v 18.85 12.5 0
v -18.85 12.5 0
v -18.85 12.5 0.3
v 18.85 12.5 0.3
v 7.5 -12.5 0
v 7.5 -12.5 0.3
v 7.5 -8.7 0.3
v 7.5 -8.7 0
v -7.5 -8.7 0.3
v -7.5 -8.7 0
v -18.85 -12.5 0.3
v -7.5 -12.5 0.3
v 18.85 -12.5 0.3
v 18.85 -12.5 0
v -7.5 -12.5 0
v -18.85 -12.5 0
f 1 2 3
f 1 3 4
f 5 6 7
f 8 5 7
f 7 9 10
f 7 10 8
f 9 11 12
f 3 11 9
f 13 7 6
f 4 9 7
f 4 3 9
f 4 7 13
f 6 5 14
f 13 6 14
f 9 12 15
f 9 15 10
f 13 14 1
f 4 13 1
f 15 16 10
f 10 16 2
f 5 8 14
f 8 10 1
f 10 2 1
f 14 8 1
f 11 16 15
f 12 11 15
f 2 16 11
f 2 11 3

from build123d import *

# Parameters (mm, degrees)
SKETCH1_W           = 37.7
SKETCH1_H           = 25
BOSS_EXTRUDE1_DEPTH = 0.3
CUT_EXTRUDE1_REACH  = 24.62
SKETCH2_W           = 15
SKETCH2_H           = 6


with BuildPart() as part:
    # Sketch1 → Boss-Extrude1 (new body)
    with BuildSketch(Plane.XY):
        Rectangle(SKETCH1_W, SKETCH1_H)
    extrude(amount=BOSS_EXTRUDE1_DEPTH)

    # Sketch2 → Cut-Extrude1 (cut, up to next)
    with BuildSketch(Plane.XY.offset(0.3), mode=Mode.PRIVATE) as cut_extrude1_sk1:
        with Locations((0, -11.7)):
            Rectangle(SKETCH2_W, SKETCH2_H)
    cut_extrude1_tool1 = extrude(cut_extrude1_sk1.sketch, amount=-CUT_EXTRUDE1_REACH, mode=Mode.PRIVATE) & part.part
    add(cut_extrude1_tool1.solids().sort_by_distance((0, -11.7, 0.3))[0], mode=Mode.SUBTRACT)


solid = part.part
